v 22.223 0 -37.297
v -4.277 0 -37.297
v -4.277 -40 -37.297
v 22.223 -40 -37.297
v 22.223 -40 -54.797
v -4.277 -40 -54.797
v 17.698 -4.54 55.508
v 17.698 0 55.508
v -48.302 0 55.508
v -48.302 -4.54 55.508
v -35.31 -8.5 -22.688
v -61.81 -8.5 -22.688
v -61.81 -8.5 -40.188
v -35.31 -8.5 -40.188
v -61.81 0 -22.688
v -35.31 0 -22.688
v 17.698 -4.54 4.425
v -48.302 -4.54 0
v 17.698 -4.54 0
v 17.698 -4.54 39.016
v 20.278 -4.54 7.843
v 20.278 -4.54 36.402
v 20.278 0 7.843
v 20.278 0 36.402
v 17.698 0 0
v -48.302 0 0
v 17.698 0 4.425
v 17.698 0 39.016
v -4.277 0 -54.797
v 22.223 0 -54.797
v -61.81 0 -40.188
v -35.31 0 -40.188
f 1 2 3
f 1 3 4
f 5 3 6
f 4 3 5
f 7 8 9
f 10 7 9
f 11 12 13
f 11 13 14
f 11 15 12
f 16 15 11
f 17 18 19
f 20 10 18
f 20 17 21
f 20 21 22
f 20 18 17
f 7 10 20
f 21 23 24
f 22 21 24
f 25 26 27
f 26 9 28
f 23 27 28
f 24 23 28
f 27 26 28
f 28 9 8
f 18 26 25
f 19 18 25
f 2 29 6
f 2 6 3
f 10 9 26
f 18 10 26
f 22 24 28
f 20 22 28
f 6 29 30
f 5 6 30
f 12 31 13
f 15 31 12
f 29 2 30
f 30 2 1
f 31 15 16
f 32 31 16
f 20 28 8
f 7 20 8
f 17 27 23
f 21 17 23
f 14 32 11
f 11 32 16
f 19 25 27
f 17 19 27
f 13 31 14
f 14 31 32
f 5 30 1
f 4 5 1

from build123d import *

# Parameters (mm, degrees)
F1_DEPTH = 4.54
F2_W     = 26.5
F2_H     = 17.5
F3_DEPTH = 40
F4_W     = 26.5
F4_H     = 17.5
F5_DEPTH = 8.5


with BuildPart() as f1:
    # F0 (on Front) → F1 (new body)
    with BuildSketch(Plane.XZ):
        Polygon((-48.301934, 55.507566), (-48.301934, 0), (17.698066, 0), (17.698066, 4.424516), (20.278066, 7.843461), (20.278066, 36.4017), (17.698066, 39.016187), (17.698066, 55.507566), align=None)
    extrude(amount=F1_DEPTH)


with BuildPart() as f3:
    # F2 (on Front) → F3 (new body)
    with BuildSketch(Plane.XZ):
        with Locations((8.972736, -46.046509)):
            Rectangle(F2_W, F2_H)
    extrude(amount=F3_DEPTH)


with BuildPart() as f5:
    # F4 (on Front) → F5 (new body)
    with BuildSketch(Plane.XZ):
        with Locations((-48.55953, -31.438339)):
            Rectangle(F4_W, F4_H)
    extrude(amount=F5_DEPTH)


solid = Compound([f1.part, f3.part, f5.part])
